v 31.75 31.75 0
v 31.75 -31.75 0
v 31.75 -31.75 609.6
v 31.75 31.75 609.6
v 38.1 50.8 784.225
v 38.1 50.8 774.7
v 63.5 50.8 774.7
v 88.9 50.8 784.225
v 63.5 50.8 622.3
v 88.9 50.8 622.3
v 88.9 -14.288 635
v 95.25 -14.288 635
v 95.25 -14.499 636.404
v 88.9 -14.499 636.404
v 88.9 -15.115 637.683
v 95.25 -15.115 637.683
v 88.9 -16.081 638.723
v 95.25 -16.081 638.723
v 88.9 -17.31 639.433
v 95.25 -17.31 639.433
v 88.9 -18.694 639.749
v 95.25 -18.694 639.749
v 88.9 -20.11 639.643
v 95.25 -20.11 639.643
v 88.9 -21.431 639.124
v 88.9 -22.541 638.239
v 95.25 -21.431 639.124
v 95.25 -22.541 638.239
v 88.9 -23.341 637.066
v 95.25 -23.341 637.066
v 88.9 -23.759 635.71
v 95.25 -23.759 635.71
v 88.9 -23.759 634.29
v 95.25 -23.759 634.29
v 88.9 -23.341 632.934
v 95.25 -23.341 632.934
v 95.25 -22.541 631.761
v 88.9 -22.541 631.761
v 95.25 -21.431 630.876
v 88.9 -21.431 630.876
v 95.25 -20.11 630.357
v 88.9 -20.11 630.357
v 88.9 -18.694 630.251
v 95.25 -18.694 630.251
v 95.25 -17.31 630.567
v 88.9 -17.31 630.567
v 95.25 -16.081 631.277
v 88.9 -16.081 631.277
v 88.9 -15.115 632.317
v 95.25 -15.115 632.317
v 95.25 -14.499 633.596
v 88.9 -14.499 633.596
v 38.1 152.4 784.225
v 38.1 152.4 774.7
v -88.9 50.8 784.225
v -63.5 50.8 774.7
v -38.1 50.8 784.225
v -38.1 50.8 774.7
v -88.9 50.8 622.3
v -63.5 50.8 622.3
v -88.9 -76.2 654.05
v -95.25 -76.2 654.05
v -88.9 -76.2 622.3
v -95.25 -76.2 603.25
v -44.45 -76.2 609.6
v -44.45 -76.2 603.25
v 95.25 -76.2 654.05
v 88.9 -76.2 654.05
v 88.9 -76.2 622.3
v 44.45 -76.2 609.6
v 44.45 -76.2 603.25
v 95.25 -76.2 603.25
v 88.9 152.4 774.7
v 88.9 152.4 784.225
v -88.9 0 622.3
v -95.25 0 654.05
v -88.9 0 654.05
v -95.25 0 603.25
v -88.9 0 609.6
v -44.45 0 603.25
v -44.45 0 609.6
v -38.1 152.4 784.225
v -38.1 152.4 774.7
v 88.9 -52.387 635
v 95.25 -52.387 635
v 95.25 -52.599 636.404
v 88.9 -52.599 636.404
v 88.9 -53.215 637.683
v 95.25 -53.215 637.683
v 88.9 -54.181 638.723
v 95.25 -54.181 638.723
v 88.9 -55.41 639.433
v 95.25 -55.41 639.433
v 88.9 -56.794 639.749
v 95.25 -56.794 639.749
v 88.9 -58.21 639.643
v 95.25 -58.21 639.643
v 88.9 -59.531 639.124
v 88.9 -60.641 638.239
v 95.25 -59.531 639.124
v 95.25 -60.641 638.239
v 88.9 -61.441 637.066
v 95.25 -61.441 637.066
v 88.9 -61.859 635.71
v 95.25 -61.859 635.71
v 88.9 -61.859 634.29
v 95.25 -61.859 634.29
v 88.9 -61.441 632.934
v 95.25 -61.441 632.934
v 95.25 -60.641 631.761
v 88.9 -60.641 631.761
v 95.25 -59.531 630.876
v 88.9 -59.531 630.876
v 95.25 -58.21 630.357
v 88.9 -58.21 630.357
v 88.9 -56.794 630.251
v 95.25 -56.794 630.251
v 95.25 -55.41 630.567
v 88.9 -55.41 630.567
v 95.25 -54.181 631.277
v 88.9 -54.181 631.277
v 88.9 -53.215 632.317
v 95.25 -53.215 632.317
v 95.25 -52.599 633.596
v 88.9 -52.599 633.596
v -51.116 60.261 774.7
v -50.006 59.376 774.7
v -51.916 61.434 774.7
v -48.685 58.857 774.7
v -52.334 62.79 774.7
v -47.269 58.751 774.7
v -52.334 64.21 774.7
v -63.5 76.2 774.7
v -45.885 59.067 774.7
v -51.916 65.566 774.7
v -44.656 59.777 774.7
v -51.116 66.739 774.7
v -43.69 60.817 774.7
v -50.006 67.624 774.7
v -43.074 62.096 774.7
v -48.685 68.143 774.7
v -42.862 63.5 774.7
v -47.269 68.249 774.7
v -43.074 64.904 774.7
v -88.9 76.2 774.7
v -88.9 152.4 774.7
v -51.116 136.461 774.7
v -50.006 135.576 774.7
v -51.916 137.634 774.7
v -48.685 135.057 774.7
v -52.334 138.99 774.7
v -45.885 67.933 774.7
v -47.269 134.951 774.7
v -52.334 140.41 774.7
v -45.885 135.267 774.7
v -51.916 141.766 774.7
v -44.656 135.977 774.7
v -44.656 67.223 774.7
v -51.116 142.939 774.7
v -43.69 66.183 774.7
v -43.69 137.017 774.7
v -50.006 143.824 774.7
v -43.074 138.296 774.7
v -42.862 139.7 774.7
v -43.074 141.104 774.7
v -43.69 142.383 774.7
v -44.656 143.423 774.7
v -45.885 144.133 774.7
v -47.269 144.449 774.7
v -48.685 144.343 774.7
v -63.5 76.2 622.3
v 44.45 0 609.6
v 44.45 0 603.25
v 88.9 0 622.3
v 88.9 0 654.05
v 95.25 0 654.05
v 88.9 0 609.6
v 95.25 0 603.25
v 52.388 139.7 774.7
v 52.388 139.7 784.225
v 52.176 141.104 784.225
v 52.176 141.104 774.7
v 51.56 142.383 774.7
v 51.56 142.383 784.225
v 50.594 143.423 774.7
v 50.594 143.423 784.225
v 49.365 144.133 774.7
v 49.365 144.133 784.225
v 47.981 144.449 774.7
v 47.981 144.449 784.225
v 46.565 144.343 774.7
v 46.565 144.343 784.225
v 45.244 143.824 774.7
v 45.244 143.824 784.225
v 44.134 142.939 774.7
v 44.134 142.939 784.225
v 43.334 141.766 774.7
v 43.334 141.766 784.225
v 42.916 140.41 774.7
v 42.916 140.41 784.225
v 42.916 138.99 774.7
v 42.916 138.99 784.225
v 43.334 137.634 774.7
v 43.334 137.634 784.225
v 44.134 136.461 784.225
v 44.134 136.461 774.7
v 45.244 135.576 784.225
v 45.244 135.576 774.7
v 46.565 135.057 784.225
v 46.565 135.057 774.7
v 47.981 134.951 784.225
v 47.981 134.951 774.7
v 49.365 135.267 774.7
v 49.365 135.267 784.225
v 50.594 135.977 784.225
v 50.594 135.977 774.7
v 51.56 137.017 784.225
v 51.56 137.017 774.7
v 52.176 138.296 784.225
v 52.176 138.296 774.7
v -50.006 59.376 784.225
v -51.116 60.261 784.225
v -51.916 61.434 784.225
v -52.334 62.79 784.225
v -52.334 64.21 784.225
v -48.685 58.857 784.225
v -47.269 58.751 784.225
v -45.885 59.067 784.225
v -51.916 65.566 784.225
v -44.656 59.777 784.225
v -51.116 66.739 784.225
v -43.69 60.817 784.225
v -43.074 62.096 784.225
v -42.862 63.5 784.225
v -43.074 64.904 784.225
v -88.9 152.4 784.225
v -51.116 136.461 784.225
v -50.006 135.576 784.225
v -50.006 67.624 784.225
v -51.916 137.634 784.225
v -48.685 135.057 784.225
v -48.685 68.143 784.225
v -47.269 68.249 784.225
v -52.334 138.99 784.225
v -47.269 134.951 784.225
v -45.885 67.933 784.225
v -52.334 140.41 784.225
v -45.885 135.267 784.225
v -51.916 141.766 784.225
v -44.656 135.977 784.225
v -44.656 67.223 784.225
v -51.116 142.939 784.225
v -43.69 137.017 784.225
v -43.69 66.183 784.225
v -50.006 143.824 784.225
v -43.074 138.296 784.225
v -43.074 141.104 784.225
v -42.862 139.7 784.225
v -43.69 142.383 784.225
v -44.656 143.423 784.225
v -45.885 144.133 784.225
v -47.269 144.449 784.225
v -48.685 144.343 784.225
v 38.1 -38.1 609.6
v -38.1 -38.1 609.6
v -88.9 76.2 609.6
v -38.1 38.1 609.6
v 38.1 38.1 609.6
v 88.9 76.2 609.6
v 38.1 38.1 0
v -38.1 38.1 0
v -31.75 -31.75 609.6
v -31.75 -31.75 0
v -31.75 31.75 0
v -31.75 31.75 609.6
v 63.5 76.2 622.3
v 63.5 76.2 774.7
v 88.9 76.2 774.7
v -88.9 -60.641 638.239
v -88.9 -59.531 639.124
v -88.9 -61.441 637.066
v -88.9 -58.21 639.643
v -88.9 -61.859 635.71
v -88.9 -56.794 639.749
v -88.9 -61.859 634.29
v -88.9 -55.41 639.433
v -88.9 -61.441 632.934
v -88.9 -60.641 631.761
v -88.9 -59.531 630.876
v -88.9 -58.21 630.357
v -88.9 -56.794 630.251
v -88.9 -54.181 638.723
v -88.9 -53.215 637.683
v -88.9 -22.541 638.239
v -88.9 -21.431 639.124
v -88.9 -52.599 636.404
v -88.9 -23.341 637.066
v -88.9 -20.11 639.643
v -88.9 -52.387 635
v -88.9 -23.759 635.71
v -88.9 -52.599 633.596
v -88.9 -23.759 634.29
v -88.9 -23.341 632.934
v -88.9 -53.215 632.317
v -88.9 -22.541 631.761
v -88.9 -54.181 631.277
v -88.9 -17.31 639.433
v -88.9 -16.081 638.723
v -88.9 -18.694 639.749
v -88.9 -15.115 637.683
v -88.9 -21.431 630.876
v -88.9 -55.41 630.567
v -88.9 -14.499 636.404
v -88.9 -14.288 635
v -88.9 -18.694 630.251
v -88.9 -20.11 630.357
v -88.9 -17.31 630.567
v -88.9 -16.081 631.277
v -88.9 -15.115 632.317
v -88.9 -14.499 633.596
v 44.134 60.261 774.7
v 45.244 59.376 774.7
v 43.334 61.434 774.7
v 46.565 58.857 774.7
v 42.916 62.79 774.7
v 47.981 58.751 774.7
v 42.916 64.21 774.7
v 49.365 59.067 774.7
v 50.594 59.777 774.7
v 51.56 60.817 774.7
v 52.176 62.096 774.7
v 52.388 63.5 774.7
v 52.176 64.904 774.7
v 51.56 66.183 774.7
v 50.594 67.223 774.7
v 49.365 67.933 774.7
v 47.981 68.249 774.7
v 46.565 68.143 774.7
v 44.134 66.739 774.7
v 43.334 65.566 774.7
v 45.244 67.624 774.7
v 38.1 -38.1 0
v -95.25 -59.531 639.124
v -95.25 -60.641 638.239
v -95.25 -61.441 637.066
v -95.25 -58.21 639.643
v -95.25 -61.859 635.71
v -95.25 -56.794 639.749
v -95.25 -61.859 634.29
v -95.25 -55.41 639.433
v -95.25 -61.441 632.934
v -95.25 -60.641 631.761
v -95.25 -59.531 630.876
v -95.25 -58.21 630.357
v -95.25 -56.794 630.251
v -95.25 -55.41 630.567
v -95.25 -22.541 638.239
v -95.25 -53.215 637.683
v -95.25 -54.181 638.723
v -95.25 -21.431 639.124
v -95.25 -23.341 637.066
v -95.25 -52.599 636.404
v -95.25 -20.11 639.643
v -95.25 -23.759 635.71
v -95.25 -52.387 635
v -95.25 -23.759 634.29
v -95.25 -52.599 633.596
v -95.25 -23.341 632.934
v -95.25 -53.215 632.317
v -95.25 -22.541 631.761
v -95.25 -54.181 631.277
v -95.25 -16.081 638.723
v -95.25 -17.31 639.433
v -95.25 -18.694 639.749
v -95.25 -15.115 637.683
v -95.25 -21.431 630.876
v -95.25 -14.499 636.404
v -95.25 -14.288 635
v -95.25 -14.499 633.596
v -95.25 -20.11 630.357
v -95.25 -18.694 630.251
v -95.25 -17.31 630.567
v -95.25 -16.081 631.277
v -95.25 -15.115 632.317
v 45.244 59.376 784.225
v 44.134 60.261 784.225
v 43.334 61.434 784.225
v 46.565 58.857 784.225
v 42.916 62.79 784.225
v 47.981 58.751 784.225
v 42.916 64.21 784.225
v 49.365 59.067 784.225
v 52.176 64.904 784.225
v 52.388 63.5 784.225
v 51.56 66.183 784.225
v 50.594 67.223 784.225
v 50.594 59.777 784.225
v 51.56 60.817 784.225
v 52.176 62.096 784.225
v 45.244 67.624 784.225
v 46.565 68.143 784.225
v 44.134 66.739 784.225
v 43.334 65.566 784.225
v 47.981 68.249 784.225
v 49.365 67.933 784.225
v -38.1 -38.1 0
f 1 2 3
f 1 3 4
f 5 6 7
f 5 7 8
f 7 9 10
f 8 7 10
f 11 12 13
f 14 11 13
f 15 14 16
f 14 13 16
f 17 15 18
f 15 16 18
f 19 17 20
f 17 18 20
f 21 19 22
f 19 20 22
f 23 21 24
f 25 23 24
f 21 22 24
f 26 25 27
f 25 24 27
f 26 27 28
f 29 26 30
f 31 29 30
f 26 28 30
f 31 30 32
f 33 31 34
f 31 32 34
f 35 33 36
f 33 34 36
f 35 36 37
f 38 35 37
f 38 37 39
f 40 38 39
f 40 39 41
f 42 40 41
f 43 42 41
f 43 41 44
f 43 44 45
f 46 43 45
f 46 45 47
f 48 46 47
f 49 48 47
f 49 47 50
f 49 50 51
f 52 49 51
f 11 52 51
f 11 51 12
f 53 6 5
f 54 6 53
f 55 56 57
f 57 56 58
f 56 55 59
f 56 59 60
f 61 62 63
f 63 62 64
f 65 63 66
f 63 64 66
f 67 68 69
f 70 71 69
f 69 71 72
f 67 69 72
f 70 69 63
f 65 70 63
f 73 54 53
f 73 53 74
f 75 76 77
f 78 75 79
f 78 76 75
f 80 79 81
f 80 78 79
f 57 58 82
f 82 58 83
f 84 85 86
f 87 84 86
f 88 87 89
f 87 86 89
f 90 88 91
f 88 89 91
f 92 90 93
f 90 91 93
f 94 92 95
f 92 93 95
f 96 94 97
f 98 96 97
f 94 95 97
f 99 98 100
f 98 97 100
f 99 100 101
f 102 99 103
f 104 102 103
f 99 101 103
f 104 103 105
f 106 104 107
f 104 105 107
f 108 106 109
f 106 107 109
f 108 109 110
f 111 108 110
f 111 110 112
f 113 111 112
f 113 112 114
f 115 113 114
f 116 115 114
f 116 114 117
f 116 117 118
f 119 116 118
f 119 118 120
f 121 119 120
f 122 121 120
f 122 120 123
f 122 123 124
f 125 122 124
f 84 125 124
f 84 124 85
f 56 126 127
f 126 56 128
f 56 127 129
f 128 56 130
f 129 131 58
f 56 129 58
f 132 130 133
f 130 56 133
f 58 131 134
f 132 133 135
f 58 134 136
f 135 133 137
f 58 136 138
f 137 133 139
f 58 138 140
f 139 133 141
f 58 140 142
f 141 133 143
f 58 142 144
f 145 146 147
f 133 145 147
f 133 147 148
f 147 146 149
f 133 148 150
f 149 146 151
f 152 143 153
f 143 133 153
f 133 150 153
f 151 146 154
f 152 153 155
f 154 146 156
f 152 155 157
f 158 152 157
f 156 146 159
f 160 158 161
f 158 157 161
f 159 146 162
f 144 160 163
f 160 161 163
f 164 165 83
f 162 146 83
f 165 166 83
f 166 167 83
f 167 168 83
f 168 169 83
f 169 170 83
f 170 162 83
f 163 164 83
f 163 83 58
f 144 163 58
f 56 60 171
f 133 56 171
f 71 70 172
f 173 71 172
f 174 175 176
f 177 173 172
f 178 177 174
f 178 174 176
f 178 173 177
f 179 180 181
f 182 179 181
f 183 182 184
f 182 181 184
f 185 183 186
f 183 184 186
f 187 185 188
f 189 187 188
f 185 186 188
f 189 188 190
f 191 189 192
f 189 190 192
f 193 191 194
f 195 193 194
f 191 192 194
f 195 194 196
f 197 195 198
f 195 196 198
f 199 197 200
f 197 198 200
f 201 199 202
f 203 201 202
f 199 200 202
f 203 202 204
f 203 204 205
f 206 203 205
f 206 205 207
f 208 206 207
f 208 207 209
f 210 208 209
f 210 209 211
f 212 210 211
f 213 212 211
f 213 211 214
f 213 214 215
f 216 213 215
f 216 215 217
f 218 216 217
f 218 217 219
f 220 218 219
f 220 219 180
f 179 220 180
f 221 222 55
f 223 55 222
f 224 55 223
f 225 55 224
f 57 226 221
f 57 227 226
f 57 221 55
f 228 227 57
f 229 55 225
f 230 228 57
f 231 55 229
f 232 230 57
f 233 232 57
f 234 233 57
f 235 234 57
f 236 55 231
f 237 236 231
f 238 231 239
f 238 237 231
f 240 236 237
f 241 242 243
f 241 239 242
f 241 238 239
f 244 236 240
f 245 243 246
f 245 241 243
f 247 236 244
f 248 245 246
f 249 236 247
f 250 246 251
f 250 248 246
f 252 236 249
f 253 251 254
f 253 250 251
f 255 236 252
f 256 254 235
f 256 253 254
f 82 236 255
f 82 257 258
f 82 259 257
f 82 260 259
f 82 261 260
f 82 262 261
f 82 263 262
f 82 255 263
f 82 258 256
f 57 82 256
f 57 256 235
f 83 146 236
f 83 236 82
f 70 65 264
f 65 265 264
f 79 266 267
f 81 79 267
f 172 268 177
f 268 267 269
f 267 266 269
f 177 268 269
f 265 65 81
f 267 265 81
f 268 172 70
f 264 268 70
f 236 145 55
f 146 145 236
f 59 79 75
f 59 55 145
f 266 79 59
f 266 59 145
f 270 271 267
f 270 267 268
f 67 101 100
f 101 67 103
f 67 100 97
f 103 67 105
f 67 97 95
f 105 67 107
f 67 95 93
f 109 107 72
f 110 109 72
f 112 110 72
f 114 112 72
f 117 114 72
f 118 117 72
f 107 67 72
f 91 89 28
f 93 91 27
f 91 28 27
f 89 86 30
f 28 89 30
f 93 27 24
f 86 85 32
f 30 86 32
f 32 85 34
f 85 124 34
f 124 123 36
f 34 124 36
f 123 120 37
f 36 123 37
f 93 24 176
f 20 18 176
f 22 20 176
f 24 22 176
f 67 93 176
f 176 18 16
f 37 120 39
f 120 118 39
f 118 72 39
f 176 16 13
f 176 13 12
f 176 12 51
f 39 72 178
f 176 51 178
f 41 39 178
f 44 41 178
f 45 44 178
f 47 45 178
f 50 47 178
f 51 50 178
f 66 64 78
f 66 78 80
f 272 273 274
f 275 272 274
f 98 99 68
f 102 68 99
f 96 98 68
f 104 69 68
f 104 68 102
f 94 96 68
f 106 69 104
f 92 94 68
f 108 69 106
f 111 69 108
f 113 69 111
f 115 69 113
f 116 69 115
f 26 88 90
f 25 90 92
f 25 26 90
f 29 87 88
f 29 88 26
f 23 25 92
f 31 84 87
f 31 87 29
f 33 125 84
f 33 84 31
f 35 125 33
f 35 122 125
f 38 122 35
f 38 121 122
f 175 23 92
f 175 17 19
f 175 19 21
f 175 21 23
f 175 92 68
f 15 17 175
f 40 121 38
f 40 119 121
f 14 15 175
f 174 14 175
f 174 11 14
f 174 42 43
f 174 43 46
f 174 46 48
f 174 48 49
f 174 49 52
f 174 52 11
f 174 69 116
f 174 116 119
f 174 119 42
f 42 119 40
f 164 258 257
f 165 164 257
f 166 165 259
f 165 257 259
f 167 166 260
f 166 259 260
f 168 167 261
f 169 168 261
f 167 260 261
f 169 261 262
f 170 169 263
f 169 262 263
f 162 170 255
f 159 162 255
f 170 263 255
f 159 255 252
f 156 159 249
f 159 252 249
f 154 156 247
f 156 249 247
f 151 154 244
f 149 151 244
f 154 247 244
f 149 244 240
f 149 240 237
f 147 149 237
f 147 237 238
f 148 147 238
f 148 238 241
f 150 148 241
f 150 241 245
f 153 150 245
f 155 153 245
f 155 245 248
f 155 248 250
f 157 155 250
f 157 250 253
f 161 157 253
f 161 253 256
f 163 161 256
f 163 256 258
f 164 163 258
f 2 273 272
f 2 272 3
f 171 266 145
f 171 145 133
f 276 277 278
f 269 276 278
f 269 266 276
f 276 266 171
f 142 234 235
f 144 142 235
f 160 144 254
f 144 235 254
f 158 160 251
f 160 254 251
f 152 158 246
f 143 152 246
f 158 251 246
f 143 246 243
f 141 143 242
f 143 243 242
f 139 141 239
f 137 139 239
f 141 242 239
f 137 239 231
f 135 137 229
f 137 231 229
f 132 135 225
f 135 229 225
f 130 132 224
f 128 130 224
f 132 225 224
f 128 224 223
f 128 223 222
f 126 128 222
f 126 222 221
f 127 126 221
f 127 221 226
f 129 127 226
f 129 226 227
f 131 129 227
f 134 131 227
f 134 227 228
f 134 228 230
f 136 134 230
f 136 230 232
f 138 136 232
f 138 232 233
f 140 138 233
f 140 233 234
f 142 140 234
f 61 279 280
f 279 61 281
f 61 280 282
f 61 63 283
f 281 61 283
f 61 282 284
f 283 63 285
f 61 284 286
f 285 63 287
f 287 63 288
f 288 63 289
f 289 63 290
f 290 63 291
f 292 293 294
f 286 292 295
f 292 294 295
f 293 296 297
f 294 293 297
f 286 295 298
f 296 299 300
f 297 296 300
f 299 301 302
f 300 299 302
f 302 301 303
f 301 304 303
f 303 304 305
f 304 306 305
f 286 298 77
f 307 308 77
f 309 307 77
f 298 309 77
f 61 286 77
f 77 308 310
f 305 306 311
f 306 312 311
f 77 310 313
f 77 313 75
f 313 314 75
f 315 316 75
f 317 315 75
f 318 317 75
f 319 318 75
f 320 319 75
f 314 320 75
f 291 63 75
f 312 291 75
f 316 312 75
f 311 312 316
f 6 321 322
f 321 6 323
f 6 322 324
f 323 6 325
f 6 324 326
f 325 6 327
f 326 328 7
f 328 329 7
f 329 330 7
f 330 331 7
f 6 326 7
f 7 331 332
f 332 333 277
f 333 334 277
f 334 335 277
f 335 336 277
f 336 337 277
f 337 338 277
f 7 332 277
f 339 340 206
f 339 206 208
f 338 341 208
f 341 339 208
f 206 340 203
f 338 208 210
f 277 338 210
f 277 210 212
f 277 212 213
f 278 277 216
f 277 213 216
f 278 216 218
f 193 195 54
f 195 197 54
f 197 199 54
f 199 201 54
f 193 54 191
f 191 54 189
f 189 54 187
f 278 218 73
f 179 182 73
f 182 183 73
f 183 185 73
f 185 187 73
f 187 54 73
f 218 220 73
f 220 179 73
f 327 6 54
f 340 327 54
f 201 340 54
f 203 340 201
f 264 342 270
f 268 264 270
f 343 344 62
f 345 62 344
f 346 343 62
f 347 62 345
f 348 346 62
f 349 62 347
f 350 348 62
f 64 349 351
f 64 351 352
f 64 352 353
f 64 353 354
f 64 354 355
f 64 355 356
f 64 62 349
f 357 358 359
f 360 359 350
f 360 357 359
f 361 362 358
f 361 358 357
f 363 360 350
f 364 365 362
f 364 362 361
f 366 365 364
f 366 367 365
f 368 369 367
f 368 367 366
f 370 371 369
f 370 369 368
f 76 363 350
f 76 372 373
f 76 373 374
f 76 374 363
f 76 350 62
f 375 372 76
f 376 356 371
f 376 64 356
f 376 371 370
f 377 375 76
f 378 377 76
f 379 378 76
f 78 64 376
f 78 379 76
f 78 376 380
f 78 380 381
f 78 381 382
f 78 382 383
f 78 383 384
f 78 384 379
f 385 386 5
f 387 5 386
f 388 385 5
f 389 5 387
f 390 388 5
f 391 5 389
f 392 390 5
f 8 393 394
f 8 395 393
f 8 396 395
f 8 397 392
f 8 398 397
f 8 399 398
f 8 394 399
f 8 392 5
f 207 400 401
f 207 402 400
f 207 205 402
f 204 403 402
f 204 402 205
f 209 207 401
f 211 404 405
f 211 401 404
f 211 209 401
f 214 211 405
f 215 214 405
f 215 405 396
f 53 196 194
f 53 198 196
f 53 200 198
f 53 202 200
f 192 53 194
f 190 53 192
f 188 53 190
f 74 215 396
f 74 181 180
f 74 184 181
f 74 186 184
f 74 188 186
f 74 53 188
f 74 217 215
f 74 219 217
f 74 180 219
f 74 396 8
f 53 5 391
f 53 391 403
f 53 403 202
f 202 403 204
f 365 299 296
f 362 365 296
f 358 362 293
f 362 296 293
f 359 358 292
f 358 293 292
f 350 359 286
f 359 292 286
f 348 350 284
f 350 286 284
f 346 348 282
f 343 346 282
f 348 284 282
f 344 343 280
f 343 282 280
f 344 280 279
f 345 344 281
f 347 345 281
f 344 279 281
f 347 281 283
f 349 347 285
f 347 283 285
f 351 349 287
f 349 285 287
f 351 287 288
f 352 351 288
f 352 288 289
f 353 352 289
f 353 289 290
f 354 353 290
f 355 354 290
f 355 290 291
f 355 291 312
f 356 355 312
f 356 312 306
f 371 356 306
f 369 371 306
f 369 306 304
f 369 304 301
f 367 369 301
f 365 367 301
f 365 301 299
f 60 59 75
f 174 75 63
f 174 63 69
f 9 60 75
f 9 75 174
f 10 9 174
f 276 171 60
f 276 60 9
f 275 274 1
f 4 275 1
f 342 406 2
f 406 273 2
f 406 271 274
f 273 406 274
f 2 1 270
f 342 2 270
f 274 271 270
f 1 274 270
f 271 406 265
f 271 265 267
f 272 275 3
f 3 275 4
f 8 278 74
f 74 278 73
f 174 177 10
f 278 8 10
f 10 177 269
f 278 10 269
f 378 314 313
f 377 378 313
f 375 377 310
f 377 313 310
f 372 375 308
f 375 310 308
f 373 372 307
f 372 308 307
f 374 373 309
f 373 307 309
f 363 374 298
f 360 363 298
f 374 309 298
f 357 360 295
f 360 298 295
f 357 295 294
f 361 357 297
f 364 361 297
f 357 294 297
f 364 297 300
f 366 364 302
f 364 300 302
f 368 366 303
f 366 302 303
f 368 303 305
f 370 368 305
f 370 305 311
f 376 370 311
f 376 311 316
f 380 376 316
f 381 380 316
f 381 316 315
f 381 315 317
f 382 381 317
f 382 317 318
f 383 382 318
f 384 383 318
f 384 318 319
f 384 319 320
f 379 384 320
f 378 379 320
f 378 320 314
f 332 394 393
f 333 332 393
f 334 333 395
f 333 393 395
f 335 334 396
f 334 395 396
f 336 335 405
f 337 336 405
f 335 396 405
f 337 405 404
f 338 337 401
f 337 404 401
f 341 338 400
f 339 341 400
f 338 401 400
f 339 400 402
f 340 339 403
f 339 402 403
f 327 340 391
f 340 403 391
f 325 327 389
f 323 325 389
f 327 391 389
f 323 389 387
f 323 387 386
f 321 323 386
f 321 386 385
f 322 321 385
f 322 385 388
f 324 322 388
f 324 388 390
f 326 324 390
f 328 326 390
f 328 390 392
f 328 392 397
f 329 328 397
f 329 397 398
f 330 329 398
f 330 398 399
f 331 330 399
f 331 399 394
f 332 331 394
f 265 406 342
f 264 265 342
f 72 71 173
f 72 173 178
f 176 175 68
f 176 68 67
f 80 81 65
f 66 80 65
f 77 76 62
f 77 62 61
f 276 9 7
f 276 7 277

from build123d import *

# Parameters (mm, degrees)
F0_W      = 76.2
F0_H      = 76.2
F0_W_2    = 63.5
F0_H_2    = 63.5
F1_DEPTH  = 609.6
F2_W      = 177.8
F2_H      = 152.4
F3_DEPTH  = 12.7
F5_DEPTH  = 6.35
F6_W      = 6.35
F6_H      = 76.2
F7_DEPTH  = 44.45
F8_W      = 6.35
F8_H      = 76.2
F9_DEPTH  = 44.45
F10_R     = 4.7625
F11_DEPTH = 254
F13_W     = 25.4
F13_H     = 25.4
F14_DEPTH = 152.4
F15_W     = 50.8
F15_H     = 101.6
F16_DEPTH = 9.525
F17_W     = 50.8
F17_H     = 101.6
F18_DEPTH = 9.525
F19_R     = 4.7625
F20_DEPTH = 25.4
F21_R     = 4.7625
F22_DEPTH = 25.4


with BuildPart() as f1:
    # F0 (on Top) → F1 (new body)
    with BuildSketch(Plane.XY):
        Rectangle(F0_W, F0_H)
        Rectangle(F0_W_2, F0_H_2, mode=Mode.SUBTRACT)
    extrude(amount=F1_DEPTH)

    # F2 (on face) → F3 (join)
    with BuildSketch(Plane.XY.offset(609.6)):
        Rectangle(F2_W, F2_H)
    extrude(amount=F3_DEPTH)

    # F4 (on face) → F5 (join)
    with BuildSketch(Plane(origin=(0, 0, 609.6), x_dir=(1, 0, 0), z_dir=(0, 0, -1))):
        Polygon((95.25, 76.2), (88.9, 76.2), (44.45, 76.2), (44.45, 0), (95.25, 0), align=None)
        Polygon((-44.45, 76.2), (-88.9, 76.2), (-95.25, 76.2), (-95.25, 0), (-44.45, 0), align=None)
    extrude(amount=F5_DEPTH)

    # F6 (on face) → F7 (join)
    with BuildSketch(Plane.XY.offset(609.6)):
        with Locations((-92.075, -38.1)):
            Rectangle(F6_W, F6_H)
    extrude(amount=F7_DEPTH)

    # F8 (on face) → F9 (join)
    with BuildSketch(Plane.XY.offset(609.6)):
        with Locations((92.075, -38.1)):
            Rectangle(F8_W, F8_H)
    extrude(amount=F9_DEPTH)

    # F10 (on face) → F11 (cut)
    with BuildSketch(Plane.YZ.offset(95.25)):
        with Locations((-57.15, 635)):
            Circle(F10_R)
        with Locations((-19.05, 635)):
            Circle(F10_R)
    extrude(amount=-F11_DEPTH, mode=Mode.SUBTRACT)

    # F13 (on face) → F14 (join)
    with BuildSketch(Plane.XY.offset(622.3)):
        with Locations((-76.2, 63.5)):
            Rectangle(F13_W, F13_H)
        with Locations((76.2, 63.5)):
            Rectangle(F13_W, F13_H)
    extrude(amount=F14_DEPTH)

    # F15 (on face) → F16 (join)
    with BuildSketch(Plane.XY.offset(774.7)):
        with Locations((63.5, 101.6)):
            Rectangle(F15_W, F15_H)
    extrude(amount=F16_DEPTH)

    # F17 (on face) → F18 (join)
    with BuildSketch(Plane.XY.offset(774.7)):
        with Locations((-63.5, 101.6)):
            Rectangle(F17_W, F17_H)
    extrude(amount=F18_DEPTH)

    # F19 (on face) → F20 (cut)
    with BuildSketch(Plane.XY.offset(784.225)):
        with Locations((-47.625, 63.5)):
            Circle(F19_R)
        with Locations((-47.625, 139.7)):
            Circle(F19_R)
    extrude(amount=-F20_DEPTH, mode=Mode.SUBTRACT)

    # F21 (on face) → F22 (cut)
    with BuildSketch(Plane.XY.offset(784.225)):
        with Locations((47.625, 63.5)):
            Circle(F21_R)
        with Locations((47.625, 139.7)):
            Circle(F21_R)
    extrude(amount=-F22_DEPTH, mode=Mode.SUBTRACT)


solid = f1.part
